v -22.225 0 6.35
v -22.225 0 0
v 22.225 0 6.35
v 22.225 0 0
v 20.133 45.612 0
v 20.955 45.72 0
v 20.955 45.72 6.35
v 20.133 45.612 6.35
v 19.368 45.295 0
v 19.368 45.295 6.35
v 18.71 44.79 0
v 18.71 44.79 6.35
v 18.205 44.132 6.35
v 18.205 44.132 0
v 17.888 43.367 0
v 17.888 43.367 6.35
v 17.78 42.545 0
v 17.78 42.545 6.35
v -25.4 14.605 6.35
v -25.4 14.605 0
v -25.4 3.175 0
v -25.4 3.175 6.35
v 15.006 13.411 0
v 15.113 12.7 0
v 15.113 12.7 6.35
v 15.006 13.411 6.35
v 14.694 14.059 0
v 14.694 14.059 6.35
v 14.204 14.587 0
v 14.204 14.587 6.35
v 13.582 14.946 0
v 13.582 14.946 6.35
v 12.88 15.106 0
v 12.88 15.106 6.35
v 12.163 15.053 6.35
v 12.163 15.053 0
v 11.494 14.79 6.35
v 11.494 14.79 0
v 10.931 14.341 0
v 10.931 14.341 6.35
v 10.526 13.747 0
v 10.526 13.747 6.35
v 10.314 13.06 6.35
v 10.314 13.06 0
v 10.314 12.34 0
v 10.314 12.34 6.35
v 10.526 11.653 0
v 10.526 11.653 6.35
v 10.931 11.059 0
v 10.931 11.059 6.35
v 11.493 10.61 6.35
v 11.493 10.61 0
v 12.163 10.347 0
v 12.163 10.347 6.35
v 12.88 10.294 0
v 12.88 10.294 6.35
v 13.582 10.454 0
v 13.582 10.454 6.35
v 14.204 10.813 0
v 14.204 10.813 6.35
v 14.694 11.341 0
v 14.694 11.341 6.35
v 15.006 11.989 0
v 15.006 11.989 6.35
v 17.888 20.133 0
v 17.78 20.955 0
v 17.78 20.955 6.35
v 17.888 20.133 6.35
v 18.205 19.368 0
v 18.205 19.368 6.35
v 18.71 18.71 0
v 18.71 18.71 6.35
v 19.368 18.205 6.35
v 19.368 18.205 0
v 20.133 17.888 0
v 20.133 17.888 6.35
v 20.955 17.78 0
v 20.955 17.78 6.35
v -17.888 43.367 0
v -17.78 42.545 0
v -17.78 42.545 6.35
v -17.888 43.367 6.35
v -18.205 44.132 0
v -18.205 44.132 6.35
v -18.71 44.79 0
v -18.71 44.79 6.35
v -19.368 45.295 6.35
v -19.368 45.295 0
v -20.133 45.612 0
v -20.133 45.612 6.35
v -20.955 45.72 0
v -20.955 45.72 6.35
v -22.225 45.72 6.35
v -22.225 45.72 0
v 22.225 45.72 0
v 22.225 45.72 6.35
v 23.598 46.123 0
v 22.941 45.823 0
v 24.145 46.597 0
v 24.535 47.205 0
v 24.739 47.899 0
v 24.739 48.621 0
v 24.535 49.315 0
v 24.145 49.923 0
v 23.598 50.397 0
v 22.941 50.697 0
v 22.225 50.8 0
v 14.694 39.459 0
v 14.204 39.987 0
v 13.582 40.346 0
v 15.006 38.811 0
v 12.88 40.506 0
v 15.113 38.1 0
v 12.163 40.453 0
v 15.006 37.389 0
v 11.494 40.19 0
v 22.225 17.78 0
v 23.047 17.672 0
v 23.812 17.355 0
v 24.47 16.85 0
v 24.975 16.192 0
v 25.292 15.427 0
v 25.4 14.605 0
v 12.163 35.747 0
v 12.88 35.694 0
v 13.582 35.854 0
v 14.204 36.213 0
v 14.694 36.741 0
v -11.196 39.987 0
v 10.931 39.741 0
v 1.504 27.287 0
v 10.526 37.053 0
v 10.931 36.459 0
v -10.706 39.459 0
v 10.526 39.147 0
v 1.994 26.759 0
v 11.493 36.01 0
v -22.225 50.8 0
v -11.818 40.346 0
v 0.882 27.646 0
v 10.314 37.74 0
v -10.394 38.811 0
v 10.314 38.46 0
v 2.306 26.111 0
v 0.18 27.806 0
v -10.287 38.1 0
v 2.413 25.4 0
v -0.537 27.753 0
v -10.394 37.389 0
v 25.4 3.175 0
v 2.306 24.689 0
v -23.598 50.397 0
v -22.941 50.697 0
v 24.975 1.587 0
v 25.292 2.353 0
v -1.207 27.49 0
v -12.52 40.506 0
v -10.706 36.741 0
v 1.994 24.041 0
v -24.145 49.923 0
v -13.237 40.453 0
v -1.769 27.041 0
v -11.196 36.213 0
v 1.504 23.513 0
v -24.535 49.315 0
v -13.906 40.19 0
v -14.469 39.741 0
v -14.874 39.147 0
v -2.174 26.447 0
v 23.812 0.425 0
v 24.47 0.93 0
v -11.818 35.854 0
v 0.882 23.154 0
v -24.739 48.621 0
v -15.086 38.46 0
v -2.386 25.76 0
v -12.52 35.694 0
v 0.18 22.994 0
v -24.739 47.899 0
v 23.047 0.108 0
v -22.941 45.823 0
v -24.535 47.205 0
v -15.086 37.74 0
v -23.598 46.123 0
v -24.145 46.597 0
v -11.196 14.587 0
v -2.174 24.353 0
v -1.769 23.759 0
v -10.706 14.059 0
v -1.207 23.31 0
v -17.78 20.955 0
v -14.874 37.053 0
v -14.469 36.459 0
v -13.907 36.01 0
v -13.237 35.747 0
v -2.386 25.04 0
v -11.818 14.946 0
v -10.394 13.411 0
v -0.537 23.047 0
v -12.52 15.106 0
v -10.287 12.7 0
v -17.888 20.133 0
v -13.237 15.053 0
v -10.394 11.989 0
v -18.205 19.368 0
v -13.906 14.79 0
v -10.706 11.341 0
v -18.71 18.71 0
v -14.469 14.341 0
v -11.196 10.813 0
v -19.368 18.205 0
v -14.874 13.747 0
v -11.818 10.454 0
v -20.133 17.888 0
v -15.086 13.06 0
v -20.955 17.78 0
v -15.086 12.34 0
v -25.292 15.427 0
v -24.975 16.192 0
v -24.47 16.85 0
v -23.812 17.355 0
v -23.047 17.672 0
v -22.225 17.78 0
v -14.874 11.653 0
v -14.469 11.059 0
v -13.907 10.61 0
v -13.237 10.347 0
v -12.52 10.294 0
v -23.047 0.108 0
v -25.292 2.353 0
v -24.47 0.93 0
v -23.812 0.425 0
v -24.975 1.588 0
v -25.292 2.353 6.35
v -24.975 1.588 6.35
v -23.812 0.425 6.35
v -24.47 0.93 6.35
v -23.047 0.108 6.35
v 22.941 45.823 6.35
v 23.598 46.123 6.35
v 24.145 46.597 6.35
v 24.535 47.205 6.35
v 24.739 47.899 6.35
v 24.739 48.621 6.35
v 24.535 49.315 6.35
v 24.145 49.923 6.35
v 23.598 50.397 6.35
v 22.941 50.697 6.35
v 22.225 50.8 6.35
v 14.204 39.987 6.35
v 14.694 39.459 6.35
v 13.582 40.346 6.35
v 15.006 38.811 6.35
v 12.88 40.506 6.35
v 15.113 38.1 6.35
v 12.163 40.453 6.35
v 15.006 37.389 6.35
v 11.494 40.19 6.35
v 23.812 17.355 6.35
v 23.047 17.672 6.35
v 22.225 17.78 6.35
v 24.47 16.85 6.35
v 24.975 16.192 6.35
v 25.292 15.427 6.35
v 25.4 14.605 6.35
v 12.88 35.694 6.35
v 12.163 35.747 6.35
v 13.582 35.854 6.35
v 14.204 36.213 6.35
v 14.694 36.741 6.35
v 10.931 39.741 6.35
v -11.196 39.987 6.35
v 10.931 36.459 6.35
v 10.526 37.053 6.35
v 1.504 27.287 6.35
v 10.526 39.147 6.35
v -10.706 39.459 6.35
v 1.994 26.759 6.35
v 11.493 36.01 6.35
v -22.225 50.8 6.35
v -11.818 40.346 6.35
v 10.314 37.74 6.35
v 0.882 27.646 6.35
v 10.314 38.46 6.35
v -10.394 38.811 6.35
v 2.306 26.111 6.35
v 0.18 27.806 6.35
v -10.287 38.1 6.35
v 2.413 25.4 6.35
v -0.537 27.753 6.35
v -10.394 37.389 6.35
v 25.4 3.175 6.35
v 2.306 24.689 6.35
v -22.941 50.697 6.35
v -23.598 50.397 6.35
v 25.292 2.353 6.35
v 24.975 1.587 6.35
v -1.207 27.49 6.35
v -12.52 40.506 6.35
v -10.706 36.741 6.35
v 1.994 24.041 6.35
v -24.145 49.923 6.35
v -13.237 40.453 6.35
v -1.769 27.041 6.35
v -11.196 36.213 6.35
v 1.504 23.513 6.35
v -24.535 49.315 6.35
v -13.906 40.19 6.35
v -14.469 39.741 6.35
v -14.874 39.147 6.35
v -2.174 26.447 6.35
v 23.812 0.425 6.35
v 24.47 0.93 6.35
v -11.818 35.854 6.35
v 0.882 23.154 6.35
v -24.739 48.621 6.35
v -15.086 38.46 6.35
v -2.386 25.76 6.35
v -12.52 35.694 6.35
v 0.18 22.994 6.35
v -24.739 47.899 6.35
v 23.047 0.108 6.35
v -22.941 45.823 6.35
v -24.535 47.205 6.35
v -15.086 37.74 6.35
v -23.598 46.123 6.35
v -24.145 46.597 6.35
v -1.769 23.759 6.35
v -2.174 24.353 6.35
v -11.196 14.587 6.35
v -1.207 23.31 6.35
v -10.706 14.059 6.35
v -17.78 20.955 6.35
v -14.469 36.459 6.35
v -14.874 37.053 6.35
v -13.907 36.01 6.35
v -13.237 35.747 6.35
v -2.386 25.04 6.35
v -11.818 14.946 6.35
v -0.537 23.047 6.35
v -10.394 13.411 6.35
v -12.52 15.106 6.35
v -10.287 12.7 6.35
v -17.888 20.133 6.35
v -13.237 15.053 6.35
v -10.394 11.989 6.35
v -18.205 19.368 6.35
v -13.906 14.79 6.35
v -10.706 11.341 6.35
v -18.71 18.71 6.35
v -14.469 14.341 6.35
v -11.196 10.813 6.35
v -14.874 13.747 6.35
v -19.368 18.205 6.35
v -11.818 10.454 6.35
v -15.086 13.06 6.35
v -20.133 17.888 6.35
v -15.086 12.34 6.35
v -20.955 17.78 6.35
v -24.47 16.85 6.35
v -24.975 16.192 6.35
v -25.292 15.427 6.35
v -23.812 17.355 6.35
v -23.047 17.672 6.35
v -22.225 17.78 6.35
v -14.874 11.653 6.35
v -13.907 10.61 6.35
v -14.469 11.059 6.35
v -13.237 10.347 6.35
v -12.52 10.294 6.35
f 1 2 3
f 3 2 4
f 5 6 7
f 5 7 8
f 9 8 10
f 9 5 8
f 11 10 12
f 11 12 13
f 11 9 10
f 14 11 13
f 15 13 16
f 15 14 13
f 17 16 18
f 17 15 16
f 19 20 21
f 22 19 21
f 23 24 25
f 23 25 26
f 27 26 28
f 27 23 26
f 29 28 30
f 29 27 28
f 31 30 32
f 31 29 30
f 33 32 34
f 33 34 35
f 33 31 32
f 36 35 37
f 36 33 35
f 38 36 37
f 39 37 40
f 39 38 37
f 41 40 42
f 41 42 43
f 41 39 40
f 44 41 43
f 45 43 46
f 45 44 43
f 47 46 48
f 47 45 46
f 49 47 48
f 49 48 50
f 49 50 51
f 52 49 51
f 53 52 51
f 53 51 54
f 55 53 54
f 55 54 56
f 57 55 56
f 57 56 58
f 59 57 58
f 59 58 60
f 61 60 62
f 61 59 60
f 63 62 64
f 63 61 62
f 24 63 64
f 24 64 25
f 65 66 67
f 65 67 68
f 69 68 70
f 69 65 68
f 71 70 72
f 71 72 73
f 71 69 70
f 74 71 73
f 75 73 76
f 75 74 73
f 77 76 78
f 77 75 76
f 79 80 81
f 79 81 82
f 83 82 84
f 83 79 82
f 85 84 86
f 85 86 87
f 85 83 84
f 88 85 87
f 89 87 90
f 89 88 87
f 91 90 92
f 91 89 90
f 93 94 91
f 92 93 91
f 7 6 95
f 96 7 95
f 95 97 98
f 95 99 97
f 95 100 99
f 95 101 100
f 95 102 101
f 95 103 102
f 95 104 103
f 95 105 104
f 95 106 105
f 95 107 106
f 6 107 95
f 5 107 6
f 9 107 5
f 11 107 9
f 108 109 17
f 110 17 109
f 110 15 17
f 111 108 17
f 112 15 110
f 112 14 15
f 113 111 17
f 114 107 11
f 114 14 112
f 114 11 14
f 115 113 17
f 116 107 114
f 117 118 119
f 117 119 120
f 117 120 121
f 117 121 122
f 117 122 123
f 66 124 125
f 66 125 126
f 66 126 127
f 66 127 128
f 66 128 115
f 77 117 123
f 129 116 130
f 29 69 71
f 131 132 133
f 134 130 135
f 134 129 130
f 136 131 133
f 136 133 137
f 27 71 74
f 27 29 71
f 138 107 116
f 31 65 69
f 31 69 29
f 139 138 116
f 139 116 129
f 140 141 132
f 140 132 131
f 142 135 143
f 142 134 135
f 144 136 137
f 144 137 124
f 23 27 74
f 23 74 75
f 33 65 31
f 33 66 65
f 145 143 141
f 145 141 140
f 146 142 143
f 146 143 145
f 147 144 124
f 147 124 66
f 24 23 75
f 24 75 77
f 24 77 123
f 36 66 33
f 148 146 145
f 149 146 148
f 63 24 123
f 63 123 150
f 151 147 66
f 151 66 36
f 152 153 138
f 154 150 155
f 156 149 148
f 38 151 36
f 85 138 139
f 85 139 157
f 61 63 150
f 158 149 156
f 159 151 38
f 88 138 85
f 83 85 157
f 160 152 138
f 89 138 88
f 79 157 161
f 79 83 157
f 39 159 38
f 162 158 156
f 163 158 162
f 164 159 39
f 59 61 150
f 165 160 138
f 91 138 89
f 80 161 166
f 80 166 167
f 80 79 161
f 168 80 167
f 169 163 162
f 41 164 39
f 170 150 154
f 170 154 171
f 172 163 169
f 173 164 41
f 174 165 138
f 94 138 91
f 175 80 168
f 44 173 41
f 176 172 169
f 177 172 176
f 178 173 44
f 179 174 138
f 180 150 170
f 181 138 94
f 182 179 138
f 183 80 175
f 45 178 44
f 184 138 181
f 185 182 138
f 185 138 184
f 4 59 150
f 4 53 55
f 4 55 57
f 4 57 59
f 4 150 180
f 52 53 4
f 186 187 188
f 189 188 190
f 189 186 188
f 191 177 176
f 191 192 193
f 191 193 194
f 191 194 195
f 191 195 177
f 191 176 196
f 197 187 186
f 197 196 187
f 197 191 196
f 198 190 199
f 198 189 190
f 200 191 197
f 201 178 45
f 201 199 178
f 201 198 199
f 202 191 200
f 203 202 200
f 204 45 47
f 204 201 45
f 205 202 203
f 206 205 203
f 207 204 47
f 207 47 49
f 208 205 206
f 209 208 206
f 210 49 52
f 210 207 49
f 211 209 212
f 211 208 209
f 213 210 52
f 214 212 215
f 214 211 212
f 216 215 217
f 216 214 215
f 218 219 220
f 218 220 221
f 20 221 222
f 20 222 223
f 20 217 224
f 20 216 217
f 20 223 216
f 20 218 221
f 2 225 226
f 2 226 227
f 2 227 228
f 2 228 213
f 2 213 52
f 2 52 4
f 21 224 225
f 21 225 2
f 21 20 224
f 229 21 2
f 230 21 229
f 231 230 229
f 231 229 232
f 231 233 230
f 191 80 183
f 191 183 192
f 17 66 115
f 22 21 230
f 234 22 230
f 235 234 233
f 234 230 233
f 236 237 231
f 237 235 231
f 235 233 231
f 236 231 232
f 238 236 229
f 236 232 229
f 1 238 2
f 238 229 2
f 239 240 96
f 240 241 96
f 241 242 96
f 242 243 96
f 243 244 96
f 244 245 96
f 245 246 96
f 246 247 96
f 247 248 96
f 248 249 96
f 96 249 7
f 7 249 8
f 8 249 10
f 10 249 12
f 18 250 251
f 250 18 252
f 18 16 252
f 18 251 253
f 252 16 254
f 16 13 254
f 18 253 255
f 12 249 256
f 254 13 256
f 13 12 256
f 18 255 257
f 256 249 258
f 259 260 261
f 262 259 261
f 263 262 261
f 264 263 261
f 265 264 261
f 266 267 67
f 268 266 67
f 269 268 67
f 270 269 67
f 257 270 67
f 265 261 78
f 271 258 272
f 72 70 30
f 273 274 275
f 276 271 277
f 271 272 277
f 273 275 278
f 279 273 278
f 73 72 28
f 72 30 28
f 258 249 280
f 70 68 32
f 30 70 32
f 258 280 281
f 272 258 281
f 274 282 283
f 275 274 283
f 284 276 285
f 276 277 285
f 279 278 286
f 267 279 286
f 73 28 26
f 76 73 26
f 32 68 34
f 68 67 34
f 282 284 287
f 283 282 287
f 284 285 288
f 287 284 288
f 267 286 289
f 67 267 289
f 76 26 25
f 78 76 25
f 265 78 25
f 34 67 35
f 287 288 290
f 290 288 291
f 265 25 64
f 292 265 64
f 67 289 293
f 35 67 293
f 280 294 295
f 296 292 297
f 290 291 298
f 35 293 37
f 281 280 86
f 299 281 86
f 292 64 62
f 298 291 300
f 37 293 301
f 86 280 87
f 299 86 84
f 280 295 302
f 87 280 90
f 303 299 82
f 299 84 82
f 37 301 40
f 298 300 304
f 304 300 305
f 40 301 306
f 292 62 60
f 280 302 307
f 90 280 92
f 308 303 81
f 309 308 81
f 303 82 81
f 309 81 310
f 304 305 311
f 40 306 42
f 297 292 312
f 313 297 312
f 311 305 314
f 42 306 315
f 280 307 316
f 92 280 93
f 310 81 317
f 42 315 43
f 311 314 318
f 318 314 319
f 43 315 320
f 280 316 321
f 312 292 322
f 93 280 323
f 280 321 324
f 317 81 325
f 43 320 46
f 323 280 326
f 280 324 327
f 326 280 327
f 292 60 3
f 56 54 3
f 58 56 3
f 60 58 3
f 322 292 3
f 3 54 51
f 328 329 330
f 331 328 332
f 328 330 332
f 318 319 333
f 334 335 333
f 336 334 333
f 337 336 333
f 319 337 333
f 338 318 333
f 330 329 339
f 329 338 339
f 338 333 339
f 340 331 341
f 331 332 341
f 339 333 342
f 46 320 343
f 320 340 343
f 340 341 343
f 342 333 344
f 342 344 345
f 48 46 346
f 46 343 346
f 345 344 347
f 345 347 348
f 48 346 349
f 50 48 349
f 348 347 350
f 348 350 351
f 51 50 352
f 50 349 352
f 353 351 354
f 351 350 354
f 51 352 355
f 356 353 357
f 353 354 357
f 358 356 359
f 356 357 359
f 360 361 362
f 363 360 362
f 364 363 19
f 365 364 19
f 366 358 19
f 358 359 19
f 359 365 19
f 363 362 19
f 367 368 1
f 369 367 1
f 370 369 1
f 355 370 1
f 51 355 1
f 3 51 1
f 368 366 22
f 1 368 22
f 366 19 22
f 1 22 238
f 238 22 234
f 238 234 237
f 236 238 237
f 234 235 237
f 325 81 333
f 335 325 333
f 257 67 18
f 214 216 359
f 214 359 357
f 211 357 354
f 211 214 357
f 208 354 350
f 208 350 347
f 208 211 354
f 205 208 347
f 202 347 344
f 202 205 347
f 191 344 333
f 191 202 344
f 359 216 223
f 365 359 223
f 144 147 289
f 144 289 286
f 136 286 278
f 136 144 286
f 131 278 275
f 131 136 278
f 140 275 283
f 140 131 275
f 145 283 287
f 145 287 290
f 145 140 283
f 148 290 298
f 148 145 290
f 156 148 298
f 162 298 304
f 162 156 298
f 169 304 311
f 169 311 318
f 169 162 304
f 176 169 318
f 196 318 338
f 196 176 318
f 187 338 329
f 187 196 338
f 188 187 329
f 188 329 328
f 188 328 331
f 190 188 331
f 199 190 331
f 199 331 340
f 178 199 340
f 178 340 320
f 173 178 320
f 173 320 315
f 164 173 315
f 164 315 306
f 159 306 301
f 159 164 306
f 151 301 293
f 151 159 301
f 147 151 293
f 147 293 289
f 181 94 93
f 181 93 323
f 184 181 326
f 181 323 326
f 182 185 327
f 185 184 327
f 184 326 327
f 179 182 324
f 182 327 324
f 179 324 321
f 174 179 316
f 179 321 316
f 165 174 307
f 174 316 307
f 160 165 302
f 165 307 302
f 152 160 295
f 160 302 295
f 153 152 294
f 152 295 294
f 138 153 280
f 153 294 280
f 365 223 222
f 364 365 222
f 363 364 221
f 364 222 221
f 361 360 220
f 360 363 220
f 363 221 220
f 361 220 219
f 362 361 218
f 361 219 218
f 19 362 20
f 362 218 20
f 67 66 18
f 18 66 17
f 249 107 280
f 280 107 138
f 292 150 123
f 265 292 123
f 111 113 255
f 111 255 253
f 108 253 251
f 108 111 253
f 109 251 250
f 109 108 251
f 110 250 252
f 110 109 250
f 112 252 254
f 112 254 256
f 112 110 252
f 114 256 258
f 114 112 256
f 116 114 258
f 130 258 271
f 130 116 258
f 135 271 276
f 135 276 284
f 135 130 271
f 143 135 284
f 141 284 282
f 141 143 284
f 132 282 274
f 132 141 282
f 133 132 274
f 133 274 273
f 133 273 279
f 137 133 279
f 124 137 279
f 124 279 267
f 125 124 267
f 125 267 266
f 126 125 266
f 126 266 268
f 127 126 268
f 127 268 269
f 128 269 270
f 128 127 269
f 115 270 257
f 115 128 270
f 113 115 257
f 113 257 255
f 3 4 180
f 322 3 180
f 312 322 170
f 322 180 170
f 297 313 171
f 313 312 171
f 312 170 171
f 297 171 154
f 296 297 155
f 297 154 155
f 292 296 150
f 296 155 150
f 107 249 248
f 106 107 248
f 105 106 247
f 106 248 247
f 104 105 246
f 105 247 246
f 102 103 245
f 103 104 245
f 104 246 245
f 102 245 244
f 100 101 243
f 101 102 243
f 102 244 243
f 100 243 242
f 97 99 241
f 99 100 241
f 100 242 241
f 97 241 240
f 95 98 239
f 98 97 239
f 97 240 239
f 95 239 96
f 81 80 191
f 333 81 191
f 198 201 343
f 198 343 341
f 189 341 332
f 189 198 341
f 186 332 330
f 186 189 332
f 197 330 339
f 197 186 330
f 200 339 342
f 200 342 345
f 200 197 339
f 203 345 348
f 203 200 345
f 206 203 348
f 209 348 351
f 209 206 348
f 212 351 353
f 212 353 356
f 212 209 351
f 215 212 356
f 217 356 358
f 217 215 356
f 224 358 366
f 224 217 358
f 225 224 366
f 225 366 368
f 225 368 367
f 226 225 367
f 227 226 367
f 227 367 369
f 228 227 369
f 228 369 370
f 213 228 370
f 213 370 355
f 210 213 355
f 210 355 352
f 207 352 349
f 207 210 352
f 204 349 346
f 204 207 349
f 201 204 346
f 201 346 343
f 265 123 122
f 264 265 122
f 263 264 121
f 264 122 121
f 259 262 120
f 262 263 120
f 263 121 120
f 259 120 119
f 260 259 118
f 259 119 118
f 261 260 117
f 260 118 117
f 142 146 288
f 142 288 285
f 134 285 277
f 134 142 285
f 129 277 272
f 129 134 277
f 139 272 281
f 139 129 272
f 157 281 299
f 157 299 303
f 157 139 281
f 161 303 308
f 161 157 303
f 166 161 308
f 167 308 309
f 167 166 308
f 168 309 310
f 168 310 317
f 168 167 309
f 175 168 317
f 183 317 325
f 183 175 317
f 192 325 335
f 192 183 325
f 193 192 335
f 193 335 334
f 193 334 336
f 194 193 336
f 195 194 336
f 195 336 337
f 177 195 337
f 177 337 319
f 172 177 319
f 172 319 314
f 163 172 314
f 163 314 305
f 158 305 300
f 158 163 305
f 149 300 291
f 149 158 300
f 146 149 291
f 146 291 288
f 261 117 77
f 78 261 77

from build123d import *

# Parameters (mm, degrees)
SKETCH1_R           = 2.413
BOSS_EXTRUDE1_DEPTH = 6.35
FILLET1_R           = 3.175
FILLET3_R           = 2.54


with BuildPart() as part:
    # Sketch1 → Boss-Extrude1 (new body)
    with BuildSketch(Plane.XY):
        Polygon((-25.4, 0), (25.4, 0), (25.4, 17.78), (17.78, 17.78), (17.78, 45.72), (25.4, 45.72), (25.4, 50.8), (-25.4, 50.8), (-25.4, 45.72), (-17.78, 45.72), (-17.78, 17.78), (-25.4, 17.78), align=None)
        with Locations((-12.7, 12.7)):
            Circle(SKETCH1_R, mode=Mode.SUBTRACT)
        with Locations((12.7, 12.7)):
            Circle(SKETCH1_R, mode=Mode.SUBTRACT)
        with Locations((0, 25.4)):
            Circle(SKETCH1_R, mode=Mode.SUBTRACT)
        with Locations((-12.7, 38.1)):
            Circle(SKETCH1_R, mode=Mode.SUBTRACT)
        with Locations((12.7, 38.1)):
            Circle(SKETCH1_R, mode=Mode.SUBTRACT)
    extrude(amount=BOSS_EXTRUDE1_DEPTH)

    # Fillet1
    # the kernel refuses this fillet: 3.175 mm, written as the material it adds along each edge
    with BuildSketch(Plane(origin=(-17.78, 17.78, 0), x_dir=(0, 1, 0), z_dir=(0, 0, 1)), Plane(origin=(-17.78, 45.72, 0), x_dir=(-1, 0, 0), z_dir=(0, 0, 1)), Plane(origin=(17.78, 45.72, 0), x_dir=(0, -1, 0), z_dir=(0, 0, 1)), Plane(origin=(17.78, 17.78, 0), x_dir=(1, 0, 0), z_dir=(0, 0, 1))) as fillet1_piece_1:
        with BuildLine():
            CenterArc((FILLET1_R, FILLET1_R), FILLET1_R, 180, 90)
            Line((0, FILLET1_R), (0, 0))
            Line((0, 0), (FILLET1_R, 0))
        make_face()
    extrude(amount=6.35)
    # the kernel refuses this fillet: 3.175 mm, written as the material it takes off along each edge
    with BuildSketch(Plane(origin=(25.4, 0, -7.9375), x_dir=(-1, 0, 0), z_dir=(0, 0, 1)), Plane(origin=(-25.4, 45.72, -7.9375), x_dir=(0, 1, 0), z_dir=(0, 0, 1)), Plane(origin=(-25.4, 50.8, -7.9375), x_dir=(1, 0, 0), z_dir=(0, 0, 1)), Plane(origin=(25.4, 50.8, -7.9375), x_dir=(0, -1, 0), z_dir=(0, 0, 1)), Plane(origin=(25.4, 45.72, -7.9375), x_dir=(-1, 0, 0), z_dir=(0, 0, 1)), Plane(origin=(25.4, 17.78, -7.9375), x_dir=(0, -1, 0), z_dir=(0, 0, 1))) as fillet1_2_piece_1:
        with BuildLine():
            CenterArc((FILLET1_R, -FILLET1_R), FILLET1_R, 90, 90)
            Line((0, -FILLET1_R), (0, 0))
            Line((0, 0), (FILLET1_R, 0))
        make_face()
    extrude(amount=22.225, mode=Mode.SUBTRACT)
    with BuildSketch(Plane(origin=(-25.4, 0, -7.9375), x_dir=(1, 0, 0), z_dir=(0, 0, 1)), Plane(origin=(-25.4, 17.78, -7.9375), x_dir=(0, -1, 0), z_dir=(0, 0, 1))) as fillet1_2_piece_2:
        with BuildLine():
            CenterArc((FILLET1_R, FILLET1_R), FILLET1_R, 180, 90)
            Line((0, FILLET1_R), (0, 0))
            Line((0, 0), (FILLET1_R, 0))
        make_face()
    extrude(amount=22.225, mode=Mode.SUBTRACT)

    # Fillet3
    # the kernel refuses this fillet: 2.54 mm, written as the material it takes off along each edge
    with BuildSketch(Plane(origin=(-25.335851973, 48.26, 16.390208023), x_dir=(0.774595457226018, 0.6324570164404979, 0), z_dir=(0, 0, -1))) as fillet3_piece_1:
        with BuildLine():
            CenterArc((2.409649921, 1.967478618), FILLET3_R, 129.231849882, 179.999560802)
            ThreePointArc((0.803201559, 3.934944923), (-0.299592395, 2.110600119), (0, 0))
            ThreePointArc((0, 0), (2.008041601, -0.715651727), (4.016083202, 0))
        make_face()
    extrude(amount=26.430416045, mode=Mode.SUBTRACT)
    with BuildSketch(Plane(origin=(25.335851973, 48.26, 16.390208022), x_dir=(-0.774595458044749, -0.632457015437765, 0), z_dir=(0, 0, -1))) as fillet3_piece_2:
        with BuildLine():
            CenterArc((2.409649925, 1.967478616), FILLET3_R, 129.23184966, 179.999561099)
            ThreePointArc((0.80320157, 3.934944927), (-0.299592391, 2.110600124), (0, 0))
            ThreePointArc((0, 0), (2.008041604, -0.71565173), (4.016083209, 0))
        make_face()
    extrude(amount=26.430416044, mode=Mode.SUBTRACT)


solid = part.part
